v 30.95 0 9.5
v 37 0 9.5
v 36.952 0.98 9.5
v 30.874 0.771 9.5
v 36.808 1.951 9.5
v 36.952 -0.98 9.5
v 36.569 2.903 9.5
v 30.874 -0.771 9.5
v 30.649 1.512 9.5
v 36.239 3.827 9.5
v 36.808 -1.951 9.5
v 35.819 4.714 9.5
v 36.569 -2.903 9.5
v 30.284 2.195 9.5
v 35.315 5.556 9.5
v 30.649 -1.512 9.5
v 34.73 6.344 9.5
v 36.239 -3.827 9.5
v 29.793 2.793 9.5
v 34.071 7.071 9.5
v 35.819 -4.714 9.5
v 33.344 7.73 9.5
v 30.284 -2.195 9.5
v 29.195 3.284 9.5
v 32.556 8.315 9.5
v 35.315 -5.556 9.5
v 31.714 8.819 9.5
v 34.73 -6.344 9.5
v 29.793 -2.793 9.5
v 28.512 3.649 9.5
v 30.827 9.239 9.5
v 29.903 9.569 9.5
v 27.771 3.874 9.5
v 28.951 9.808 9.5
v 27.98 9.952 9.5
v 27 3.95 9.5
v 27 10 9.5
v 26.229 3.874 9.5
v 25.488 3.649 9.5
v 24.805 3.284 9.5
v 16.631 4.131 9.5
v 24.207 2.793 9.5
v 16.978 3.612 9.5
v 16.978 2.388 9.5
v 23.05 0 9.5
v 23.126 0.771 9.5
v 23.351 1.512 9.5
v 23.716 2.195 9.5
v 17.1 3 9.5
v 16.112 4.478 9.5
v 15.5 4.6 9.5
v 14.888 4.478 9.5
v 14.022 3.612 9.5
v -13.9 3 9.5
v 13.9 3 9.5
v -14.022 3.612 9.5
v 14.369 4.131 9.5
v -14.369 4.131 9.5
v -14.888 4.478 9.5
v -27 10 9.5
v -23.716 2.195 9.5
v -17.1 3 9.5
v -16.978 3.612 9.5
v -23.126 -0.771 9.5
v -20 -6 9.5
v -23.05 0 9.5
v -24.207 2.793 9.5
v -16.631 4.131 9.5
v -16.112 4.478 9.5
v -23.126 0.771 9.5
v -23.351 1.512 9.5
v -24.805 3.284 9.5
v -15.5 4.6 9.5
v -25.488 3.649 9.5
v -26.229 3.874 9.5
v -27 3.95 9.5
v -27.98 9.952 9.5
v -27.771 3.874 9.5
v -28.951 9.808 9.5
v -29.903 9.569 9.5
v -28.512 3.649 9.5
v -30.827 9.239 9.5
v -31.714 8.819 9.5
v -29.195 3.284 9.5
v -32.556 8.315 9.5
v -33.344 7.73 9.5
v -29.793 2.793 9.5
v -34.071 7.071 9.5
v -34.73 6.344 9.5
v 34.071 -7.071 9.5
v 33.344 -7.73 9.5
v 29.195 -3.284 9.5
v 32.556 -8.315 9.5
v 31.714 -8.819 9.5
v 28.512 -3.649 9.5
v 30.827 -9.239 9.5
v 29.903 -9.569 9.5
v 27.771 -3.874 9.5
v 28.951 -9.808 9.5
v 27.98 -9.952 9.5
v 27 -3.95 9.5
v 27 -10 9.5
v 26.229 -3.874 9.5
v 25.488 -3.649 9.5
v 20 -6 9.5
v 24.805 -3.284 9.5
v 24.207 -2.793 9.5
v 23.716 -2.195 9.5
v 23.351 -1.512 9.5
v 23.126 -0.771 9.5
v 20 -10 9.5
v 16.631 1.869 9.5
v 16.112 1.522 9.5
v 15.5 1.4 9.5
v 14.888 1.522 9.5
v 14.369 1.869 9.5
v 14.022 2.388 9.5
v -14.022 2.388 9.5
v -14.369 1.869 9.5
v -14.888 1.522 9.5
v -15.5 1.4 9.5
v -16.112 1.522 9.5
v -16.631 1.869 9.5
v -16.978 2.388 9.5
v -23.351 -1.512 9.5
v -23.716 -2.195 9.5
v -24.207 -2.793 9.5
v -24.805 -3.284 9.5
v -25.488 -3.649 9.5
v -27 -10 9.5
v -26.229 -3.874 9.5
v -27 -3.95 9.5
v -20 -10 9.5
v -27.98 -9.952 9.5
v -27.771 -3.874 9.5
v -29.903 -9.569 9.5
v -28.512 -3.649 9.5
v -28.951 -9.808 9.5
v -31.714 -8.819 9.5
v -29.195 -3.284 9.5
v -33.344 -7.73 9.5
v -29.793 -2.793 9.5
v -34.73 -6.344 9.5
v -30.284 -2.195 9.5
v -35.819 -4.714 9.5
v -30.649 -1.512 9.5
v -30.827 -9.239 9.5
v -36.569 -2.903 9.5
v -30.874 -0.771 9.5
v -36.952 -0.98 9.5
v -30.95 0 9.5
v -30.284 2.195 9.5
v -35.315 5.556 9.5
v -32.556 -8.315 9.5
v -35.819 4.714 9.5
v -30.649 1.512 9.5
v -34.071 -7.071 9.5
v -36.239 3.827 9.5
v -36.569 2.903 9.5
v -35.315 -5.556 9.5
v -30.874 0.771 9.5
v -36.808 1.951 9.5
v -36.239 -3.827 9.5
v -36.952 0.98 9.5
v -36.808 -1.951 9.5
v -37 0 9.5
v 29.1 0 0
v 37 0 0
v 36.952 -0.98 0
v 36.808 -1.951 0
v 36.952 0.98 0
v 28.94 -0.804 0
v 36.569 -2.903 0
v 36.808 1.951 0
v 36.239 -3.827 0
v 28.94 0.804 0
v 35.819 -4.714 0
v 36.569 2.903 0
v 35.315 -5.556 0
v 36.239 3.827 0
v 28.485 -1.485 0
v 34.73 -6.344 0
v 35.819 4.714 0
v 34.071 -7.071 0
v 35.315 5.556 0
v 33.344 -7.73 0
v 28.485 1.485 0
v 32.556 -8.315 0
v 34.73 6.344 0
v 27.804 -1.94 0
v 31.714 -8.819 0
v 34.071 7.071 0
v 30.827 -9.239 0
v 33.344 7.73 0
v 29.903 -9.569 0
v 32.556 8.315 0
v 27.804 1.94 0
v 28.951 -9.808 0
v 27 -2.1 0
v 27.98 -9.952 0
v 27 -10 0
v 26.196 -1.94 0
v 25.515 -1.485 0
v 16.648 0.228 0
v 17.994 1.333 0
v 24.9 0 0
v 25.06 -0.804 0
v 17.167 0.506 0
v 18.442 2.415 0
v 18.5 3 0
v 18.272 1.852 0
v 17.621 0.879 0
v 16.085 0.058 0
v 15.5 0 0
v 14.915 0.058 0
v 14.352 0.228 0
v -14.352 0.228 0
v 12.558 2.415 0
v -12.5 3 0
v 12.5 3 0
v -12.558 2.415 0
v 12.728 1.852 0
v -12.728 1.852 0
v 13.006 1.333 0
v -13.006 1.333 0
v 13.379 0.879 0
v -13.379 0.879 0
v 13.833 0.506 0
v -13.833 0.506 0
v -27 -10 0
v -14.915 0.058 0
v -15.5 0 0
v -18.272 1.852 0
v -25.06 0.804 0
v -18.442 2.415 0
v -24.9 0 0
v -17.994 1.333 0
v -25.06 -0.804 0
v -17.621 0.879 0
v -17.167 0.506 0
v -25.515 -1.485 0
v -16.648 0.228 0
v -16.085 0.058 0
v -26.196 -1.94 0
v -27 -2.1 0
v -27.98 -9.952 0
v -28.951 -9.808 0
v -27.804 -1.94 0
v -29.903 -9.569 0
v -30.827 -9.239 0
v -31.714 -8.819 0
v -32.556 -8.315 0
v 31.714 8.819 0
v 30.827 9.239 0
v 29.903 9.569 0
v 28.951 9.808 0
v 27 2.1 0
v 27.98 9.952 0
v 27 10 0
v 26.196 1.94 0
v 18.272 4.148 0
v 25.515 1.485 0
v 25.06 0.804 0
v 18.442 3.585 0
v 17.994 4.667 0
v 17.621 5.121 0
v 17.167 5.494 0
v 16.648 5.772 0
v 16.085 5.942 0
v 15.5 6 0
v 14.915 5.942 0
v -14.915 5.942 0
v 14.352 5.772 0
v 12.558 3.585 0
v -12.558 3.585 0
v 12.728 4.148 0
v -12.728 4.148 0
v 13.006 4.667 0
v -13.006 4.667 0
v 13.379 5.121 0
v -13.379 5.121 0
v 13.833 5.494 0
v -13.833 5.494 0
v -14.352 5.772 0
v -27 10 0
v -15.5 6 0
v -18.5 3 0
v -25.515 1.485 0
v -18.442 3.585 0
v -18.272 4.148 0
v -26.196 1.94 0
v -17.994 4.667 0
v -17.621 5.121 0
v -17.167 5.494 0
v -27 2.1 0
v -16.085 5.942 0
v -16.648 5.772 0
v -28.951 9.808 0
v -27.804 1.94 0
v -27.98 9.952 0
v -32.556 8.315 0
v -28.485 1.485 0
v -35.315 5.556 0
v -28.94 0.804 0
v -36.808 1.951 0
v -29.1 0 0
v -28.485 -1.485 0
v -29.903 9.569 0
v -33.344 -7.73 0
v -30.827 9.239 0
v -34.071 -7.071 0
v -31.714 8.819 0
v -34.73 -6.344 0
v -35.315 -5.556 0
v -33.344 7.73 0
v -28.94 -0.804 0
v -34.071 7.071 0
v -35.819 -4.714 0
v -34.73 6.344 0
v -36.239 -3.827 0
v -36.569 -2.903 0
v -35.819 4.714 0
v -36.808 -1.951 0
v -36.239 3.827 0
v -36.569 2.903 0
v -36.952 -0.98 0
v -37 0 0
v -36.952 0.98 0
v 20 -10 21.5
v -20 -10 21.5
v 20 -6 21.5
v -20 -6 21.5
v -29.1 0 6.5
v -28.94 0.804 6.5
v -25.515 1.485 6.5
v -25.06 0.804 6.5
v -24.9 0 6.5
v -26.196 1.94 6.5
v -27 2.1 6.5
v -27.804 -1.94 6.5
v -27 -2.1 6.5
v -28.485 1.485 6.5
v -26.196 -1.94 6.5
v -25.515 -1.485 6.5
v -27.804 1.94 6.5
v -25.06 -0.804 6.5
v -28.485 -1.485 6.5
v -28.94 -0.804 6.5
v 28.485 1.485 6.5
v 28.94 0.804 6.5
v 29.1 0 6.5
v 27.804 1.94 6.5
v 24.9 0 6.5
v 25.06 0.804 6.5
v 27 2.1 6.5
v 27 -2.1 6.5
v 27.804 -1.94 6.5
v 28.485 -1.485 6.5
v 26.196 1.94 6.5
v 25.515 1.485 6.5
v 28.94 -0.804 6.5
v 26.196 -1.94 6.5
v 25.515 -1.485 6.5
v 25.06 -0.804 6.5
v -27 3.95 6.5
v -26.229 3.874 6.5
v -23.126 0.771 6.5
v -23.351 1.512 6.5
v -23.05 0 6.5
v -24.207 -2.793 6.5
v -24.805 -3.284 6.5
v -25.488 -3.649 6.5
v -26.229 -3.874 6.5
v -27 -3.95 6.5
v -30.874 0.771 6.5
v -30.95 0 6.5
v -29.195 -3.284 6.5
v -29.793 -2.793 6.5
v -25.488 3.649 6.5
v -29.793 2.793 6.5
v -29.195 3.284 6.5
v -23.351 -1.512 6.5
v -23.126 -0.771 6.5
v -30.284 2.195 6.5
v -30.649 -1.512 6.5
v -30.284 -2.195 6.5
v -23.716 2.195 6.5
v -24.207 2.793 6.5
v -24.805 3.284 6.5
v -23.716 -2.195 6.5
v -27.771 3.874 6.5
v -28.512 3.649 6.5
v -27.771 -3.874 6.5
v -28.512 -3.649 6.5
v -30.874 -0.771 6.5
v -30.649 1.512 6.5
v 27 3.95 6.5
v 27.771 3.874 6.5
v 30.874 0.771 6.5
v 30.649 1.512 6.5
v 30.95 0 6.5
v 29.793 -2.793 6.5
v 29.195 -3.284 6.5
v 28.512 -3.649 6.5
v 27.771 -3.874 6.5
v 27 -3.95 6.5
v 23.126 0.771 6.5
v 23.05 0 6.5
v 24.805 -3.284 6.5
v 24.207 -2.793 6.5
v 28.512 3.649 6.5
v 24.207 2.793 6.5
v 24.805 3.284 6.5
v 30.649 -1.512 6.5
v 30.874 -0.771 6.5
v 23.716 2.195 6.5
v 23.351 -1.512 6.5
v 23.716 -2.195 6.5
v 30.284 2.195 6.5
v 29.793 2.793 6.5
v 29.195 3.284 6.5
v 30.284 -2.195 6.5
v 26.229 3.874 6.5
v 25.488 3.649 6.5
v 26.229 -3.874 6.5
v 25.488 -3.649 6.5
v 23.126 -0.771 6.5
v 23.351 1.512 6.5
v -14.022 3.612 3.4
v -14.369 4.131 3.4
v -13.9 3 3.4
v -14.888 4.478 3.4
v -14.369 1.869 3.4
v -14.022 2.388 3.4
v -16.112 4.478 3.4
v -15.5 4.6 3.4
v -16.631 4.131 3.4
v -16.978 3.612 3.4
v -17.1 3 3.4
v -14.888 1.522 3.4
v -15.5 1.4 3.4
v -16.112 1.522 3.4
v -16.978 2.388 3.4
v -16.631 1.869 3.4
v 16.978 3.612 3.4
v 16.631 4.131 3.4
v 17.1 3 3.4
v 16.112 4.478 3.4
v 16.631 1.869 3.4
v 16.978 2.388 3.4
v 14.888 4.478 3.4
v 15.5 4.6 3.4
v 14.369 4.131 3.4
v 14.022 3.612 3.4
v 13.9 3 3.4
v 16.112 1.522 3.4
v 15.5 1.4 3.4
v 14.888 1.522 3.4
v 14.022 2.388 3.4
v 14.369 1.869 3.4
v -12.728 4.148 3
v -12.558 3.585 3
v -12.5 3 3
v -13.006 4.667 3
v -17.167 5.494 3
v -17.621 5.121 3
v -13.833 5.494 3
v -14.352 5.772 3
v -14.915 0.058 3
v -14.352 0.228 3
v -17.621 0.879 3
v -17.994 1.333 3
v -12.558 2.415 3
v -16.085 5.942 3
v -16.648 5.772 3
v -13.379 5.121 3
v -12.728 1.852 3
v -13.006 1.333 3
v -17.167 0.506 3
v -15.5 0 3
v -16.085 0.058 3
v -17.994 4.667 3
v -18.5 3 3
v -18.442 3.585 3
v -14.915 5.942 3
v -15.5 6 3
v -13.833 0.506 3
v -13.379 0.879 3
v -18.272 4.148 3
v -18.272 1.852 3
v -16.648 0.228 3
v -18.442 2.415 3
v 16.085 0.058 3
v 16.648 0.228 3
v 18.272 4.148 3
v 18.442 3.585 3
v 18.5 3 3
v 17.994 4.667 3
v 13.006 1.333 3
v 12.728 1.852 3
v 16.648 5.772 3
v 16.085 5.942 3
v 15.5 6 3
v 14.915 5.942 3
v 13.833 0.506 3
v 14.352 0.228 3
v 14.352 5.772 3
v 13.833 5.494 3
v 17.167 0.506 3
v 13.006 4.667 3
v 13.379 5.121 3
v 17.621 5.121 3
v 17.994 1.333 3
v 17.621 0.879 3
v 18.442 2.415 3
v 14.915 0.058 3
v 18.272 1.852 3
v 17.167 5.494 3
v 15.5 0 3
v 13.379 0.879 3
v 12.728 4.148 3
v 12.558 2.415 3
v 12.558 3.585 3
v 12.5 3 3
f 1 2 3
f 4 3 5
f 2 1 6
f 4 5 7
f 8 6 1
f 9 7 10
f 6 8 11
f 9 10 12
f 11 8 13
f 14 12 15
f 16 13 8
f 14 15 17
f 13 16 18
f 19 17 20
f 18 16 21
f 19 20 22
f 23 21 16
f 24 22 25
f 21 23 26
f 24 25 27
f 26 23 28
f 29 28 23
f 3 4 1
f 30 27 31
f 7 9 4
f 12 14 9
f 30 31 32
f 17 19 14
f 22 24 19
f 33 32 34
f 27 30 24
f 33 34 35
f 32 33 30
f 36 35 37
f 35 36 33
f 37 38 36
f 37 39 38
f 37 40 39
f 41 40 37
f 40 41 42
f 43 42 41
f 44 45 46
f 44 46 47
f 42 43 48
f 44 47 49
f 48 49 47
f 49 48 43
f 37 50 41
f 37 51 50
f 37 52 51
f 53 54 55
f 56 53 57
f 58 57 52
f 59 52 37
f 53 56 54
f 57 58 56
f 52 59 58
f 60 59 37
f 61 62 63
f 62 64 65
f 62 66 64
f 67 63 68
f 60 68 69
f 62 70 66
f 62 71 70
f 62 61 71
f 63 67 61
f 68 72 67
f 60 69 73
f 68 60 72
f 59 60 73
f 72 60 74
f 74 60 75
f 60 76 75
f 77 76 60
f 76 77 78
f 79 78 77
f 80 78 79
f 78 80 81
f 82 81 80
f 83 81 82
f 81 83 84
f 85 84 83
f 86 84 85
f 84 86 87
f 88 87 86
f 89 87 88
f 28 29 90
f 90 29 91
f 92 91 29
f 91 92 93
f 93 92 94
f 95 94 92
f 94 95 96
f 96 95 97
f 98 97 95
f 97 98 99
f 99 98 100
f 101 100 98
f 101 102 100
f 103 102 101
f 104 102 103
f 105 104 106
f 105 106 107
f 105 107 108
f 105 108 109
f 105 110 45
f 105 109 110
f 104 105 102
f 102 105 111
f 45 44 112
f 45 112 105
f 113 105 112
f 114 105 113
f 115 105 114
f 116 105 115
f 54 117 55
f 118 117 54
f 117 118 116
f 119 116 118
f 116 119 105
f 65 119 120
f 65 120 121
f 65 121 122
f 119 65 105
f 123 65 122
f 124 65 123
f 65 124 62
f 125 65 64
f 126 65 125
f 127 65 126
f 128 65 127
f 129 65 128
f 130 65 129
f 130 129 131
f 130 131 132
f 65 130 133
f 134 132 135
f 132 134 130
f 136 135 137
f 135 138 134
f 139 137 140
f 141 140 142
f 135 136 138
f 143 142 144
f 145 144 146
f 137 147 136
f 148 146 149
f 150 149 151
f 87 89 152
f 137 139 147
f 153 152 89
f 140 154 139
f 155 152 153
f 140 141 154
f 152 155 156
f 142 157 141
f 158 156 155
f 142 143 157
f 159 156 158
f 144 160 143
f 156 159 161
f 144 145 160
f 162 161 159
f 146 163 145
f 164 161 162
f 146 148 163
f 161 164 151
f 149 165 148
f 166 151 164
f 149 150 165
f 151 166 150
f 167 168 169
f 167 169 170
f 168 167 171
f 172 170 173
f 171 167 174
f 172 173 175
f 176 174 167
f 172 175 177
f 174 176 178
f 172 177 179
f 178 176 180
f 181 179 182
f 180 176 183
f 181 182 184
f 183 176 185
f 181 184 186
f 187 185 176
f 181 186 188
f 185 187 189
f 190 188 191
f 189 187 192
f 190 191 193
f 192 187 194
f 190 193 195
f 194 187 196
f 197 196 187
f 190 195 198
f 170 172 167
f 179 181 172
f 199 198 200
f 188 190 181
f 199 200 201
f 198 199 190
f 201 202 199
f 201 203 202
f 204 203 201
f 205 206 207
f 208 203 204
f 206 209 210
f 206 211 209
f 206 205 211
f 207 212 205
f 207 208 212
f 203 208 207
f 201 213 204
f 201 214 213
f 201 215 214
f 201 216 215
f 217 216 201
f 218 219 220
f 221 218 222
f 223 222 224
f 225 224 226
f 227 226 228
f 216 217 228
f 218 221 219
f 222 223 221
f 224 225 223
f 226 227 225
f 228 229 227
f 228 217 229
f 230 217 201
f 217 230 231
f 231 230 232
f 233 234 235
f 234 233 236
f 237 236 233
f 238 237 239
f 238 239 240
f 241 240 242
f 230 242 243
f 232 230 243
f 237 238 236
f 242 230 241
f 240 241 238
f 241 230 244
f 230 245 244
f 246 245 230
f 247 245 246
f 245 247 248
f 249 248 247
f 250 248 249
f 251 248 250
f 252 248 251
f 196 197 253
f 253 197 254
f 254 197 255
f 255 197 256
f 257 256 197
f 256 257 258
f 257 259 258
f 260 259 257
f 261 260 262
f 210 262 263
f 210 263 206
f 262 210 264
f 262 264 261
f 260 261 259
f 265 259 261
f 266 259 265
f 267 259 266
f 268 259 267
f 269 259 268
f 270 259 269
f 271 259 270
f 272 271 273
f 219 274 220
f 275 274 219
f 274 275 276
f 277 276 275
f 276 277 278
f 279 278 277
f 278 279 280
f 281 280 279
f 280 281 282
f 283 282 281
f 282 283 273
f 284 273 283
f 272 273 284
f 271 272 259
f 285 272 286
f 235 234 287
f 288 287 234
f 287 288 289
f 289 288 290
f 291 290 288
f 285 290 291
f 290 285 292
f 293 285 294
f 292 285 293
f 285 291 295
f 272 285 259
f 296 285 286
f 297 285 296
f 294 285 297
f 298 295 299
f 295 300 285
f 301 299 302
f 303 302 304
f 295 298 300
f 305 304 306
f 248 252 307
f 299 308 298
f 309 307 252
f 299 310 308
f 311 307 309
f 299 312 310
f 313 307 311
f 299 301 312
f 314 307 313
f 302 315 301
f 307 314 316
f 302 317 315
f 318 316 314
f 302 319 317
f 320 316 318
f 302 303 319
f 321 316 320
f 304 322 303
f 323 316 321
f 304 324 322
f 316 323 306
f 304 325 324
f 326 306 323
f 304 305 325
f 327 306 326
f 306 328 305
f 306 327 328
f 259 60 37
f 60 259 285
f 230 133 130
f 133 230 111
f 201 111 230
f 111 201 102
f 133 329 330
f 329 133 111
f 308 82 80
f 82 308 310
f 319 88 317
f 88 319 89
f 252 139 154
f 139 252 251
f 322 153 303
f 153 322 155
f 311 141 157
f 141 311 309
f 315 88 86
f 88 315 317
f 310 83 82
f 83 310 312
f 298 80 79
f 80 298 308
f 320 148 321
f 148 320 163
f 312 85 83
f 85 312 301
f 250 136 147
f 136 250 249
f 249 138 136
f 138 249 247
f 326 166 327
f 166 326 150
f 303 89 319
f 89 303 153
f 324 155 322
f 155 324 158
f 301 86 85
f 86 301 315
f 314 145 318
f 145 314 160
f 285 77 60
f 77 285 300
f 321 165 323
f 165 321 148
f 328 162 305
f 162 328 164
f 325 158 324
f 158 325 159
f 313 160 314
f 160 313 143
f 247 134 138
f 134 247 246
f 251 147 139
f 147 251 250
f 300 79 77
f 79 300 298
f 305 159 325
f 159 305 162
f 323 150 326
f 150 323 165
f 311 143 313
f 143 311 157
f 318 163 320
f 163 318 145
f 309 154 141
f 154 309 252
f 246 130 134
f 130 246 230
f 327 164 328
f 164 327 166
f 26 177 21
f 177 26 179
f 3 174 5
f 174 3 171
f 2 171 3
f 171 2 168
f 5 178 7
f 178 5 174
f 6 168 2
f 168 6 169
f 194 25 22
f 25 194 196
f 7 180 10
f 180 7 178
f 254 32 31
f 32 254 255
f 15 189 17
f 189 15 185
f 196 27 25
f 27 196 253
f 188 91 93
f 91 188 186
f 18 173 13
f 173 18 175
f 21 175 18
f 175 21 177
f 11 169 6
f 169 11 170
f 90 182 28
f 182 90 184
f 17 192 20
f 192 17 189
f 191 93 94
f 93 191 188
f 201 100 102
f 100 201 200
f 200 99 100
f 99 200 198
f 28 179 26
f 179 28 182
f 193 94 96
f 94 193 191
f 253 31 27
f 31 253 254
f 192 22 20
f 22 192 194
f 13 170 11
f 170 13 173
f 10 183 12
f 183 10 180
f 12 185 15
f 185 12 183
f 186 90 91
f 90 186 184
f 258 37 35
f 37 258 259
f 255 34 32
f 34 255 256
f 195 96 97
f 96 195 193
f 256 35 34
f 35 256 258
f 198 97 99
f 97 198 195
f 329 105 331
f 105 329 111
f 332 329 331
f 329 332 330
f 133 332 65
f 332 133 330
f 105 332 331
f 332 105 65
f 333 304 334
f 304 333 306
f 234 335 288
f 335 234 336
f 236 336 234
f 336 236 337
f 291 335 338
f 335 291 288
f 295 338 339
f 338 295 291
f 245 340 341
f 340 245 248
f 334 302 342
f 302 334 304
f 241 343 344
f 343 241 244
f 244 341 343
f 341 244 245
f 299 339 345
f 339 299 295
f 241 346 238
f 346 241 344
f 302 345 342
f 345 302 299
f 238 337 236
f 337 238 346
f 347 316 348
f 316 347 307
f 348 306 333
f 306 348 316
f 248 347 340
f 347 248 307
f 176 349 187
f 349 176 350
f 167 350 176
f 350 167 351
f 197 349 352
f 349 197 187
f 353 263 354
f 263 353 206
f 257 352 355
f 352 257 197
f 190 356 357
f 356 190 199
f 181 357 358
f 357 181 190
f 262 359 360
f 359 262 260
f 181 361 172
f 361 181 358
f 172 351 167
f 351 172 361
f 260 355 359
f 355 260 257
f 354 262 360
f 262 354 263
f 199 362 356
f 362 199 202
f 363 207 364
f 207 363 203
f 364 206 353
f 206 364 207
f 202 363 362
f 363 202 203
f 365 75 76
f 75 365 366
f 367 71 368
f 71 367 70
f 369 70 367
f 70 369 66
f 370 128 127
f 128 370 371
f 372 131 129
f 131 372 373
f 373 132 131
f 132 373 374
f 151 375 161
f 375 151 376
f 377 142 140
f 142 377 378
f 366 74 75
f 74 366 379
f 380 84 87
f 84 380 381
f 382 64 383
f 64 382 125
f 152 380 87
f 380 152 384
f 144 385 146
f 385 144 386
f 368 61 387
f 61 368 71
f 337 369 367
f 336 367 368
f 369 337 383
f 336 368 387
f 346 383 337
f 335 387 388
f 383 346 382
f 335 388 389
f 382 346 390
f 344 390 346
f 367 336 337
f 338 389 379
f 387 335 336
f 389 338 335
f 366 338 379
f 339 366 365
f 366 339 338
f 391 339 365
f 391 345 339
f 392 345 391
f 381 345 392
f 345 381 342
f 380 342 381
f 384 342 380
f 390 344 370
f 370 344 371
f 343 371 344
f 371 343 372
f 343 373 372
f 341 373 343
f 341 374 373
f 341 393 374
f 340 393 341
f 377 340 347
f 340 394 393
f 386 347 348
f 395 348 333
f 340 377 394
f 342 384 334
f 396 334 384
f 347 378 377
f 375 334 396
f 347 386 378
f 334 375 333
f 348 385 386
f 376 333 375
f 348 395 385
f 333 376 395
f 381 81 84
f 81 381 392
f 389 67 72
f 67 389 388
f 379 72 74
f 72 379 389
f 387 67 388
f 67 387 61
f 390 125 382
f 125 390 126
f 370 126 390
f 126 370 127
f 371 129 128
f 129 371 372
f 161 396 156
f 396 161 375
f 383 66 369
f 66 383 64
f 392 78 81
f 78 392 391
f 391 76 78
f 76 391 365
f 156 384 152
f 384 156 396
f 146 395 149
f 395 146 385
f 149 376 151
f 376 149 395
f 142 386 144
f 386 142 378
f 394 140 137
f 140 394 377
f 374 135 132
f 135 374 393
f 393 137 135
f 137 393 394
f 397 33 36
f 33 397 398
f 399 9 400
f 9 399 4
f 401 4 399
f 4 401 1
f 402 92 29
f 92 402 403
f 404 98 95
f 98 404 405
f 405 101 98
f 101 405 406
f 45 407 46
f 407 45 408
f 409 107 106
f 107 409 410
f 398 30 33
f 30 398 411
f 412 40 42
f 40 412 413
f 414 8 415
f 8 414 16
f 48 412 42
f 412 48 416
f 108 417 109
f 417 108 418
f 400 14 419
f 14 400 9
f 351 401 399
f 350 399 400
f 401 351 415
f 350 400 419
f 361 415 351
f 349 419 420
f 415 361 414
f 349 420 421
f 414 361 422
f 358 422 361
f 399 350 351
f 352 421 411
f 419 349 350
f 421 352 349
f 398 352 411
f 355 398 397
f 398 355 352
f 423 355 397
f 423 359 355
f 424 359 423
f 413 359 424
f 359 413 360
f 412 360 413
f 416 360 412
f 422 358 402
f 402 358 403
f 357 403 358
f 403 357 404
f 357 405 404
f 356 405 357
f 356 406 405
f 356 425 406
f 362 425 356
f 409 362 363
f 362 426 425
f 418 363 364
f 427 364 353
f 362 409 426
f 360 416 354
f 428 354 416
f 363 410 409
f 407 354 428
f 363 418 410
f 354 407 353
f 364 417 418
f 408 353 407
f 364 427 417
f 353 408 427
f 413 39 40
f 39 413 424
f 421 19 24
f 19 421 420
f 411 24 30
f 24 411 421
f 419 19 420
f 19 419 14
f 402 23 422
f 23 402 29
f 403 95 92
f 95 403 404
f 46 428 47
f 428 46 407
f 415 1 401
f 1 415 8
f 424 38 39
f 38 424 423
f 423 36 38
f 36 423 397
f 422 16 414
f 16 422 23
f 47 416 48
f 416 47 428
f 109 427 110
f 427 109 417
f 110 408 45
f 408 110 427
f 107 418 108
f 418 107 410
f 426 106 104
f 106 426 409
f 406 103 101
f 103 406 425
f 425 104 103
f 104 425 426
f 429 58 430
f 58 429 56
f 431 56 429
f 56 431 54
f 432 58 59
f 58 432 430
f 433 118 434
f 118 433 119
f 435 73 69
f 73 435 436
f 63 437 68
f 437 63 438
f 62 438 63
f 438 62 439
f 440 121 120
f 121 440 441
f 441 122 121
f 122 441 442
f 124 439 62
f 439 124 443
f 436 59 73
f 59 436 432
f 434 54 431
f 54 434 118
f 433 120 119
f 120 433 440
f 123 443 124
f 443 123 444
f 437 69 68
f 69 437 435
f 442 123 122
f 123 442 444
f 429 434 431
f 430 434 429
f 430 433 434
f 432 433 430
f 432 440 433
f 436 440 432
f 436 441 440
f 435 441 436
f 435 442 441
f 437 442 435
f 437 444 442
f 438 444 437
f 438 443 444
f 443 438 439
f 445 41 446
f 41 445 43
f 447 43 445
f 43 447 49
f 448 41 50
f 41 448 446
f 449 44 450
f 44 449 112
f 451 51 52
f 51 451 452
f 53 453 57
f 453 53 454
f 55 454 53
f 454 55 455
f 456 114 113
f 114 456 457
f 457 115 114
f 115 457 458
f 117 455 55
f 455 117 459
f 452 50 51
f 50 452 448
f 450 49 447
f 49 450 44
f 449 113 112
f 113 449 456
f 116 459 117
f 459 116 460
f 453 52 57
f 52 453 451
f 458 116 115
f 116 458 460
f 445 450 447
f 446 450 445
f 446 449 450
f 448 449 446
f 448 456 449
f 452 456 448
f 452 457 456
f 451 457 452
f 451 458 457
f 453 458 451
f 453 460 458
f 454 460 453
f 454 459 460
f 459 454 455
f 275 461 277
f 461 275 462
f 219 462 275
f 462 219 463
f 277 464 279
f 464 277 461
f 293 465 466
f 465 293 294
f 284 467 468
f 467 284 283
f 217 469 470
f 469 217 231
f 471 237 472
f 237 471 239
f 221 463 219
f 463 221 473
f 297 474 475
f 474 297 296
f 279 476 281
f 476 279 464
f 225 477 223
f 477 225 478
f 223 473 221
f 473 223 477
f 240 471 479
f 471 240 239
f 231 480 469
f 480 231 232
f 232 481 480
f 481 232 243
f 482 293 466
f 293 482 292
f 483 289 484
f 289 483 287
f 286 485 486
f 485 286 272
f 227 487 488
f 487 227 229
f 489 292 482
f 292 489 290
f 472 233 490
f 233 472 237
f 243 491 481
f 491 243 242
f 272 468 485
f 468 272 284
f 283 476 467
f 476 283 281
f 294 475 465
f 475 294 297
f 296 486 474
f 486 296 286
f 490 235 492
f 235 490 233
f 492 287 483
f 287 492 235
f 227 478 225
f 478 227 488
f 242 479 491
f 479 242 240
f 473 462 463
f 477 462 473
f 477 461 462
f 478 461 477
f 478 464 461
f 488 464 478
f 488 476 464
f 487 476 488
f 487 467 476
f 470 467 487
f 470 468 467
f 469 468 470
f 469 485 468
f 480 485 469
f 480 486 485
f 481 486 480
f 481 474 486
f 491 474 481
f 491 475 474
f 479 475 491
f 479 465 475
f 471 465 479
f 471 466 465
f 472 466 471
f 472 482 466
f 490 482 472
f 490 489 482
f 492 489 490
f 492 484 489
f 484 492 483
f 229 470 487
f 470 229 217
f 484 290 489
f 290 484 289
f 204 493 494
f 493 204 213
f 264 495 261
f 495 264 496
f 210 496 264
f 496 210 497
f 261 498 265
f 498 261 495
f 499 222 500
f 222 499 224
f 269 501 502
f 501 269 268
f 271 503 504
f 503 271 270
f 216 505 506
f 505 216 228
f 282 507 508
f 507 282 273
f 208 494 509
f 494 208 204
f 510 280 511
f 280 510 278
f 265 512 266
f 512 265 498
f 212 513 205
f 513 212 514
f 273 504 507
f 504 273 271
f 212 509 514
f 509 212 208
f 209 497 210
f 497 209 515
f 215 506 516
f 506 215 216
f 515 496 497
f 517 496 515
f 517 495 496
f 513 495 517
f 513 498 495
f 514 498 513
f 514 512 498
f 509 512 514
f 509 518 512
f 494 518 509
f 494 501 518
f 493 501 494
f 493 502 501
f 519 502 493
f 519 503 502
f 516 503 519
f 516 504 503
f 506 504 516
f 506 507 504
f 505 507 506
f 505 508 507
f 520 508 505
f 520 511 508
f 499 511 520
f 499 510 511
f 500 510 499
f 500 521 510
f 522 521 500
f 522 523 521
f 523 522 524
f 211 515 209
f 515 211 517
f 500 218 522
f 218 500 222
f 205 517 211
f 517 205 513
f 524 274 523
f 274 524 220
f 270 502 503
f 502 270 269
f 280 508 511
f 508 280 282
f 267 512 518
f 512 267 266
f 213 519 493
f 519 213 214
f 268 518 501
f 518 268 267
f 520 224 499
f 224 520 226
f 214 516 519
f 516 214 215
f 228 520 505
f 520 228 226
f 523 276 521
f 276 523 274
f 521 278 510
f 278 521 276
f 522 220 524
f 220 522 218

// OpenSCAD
// Mounting brackey for Ormerod extruder on 2020 Kossel
// The body screws on a JK42HS34-1334A motor are 26mm long and are recessed by 2.5mm, total 28.5mm.
// Therefore we can use a 35mm screw to fix trhe bracket to the motor if the screw goes through 6.5mm of plastic.

width=20;
m3headClear=5.6+0.4;
m3clear=3+0.2;
m3headDepth=3;
thickness=6.5+m3headDepth;
m4clear=4+0.2;
m4headClear=7.5+0.4;
m4headDepth=3;
cableGuardLength=40;
cableGuardWidth=4;
cableGuardHeight=12;

nema17holeSpacing=31;
nema17body=42;

nema17offset=3;

mountingHoleSpacing = nema17body + 2*6;
overlap=0.02;

difference() {
	// Basic shape
	union() {
		translate([0,0,thickness/2]) cube([mountingHoleSpacing,width,thickness],center=true);
		translate([-mountingHoleSpacing/2,0,0]) cylinder(r=width/2,h=thickness, $fn=64);
		translate([mountingHoleSpacing/2,0,0]) cylinder(r=width/2,h=thickness, $fn=64);

		// Cable guard
		translate([-cableGuardLength/2,-width/2,thickness-overlap])
			cube([cableGuardLength,cableGuardWidth,cableGuardHeight+overlap]);
	}

	// Holes for mounting bracket into extrusion
	translate([-mountingHoleSpacing/2,0,-overlap]) cylinder(r=m4clear/2,h=thickness+2*overlap, $fn=16);
	translate([mountingHoleSpacing/2,0,-overlap]) cylinder(r=m4clear/2,h=thickness+2*overlap, $fn=16);
	translate([-mountingHoleSpacing/2,0,thickness-m4headDepth])
		cylinder(r=m4headClear/2,h=thickness, $fn=32);
	translate([mountingHoleSpacing/2,0,thickness-m4headDepth])
		cylinder(r=m4headClear/2,h=thickness, $fn=32);

	// holed for attaching stepper motor
	translate([-nema17holeSpacing/2,nema17offset,m3headDepth+0.4]) cylinder(r=m3clear/2,h=thickness, $fn=16);
	translate([nema17holeSpacing/2,nema17offset,m3headDepth+0.4]) cylinder(r=m3clear/2,h=thickness, $fn=16);
	translate([-nema17holeSpacing/2,nema17offset,-overlap])
		cylinder(r=m3headClear/2,h=m3headDepth+overlap, $fn=32);
	translate([nema17holeSpacing/2,nema17offset,-overlap])
		cylinder(r=m3headClear/2,h=m3headDepth+overlap, $fn=32);
}
